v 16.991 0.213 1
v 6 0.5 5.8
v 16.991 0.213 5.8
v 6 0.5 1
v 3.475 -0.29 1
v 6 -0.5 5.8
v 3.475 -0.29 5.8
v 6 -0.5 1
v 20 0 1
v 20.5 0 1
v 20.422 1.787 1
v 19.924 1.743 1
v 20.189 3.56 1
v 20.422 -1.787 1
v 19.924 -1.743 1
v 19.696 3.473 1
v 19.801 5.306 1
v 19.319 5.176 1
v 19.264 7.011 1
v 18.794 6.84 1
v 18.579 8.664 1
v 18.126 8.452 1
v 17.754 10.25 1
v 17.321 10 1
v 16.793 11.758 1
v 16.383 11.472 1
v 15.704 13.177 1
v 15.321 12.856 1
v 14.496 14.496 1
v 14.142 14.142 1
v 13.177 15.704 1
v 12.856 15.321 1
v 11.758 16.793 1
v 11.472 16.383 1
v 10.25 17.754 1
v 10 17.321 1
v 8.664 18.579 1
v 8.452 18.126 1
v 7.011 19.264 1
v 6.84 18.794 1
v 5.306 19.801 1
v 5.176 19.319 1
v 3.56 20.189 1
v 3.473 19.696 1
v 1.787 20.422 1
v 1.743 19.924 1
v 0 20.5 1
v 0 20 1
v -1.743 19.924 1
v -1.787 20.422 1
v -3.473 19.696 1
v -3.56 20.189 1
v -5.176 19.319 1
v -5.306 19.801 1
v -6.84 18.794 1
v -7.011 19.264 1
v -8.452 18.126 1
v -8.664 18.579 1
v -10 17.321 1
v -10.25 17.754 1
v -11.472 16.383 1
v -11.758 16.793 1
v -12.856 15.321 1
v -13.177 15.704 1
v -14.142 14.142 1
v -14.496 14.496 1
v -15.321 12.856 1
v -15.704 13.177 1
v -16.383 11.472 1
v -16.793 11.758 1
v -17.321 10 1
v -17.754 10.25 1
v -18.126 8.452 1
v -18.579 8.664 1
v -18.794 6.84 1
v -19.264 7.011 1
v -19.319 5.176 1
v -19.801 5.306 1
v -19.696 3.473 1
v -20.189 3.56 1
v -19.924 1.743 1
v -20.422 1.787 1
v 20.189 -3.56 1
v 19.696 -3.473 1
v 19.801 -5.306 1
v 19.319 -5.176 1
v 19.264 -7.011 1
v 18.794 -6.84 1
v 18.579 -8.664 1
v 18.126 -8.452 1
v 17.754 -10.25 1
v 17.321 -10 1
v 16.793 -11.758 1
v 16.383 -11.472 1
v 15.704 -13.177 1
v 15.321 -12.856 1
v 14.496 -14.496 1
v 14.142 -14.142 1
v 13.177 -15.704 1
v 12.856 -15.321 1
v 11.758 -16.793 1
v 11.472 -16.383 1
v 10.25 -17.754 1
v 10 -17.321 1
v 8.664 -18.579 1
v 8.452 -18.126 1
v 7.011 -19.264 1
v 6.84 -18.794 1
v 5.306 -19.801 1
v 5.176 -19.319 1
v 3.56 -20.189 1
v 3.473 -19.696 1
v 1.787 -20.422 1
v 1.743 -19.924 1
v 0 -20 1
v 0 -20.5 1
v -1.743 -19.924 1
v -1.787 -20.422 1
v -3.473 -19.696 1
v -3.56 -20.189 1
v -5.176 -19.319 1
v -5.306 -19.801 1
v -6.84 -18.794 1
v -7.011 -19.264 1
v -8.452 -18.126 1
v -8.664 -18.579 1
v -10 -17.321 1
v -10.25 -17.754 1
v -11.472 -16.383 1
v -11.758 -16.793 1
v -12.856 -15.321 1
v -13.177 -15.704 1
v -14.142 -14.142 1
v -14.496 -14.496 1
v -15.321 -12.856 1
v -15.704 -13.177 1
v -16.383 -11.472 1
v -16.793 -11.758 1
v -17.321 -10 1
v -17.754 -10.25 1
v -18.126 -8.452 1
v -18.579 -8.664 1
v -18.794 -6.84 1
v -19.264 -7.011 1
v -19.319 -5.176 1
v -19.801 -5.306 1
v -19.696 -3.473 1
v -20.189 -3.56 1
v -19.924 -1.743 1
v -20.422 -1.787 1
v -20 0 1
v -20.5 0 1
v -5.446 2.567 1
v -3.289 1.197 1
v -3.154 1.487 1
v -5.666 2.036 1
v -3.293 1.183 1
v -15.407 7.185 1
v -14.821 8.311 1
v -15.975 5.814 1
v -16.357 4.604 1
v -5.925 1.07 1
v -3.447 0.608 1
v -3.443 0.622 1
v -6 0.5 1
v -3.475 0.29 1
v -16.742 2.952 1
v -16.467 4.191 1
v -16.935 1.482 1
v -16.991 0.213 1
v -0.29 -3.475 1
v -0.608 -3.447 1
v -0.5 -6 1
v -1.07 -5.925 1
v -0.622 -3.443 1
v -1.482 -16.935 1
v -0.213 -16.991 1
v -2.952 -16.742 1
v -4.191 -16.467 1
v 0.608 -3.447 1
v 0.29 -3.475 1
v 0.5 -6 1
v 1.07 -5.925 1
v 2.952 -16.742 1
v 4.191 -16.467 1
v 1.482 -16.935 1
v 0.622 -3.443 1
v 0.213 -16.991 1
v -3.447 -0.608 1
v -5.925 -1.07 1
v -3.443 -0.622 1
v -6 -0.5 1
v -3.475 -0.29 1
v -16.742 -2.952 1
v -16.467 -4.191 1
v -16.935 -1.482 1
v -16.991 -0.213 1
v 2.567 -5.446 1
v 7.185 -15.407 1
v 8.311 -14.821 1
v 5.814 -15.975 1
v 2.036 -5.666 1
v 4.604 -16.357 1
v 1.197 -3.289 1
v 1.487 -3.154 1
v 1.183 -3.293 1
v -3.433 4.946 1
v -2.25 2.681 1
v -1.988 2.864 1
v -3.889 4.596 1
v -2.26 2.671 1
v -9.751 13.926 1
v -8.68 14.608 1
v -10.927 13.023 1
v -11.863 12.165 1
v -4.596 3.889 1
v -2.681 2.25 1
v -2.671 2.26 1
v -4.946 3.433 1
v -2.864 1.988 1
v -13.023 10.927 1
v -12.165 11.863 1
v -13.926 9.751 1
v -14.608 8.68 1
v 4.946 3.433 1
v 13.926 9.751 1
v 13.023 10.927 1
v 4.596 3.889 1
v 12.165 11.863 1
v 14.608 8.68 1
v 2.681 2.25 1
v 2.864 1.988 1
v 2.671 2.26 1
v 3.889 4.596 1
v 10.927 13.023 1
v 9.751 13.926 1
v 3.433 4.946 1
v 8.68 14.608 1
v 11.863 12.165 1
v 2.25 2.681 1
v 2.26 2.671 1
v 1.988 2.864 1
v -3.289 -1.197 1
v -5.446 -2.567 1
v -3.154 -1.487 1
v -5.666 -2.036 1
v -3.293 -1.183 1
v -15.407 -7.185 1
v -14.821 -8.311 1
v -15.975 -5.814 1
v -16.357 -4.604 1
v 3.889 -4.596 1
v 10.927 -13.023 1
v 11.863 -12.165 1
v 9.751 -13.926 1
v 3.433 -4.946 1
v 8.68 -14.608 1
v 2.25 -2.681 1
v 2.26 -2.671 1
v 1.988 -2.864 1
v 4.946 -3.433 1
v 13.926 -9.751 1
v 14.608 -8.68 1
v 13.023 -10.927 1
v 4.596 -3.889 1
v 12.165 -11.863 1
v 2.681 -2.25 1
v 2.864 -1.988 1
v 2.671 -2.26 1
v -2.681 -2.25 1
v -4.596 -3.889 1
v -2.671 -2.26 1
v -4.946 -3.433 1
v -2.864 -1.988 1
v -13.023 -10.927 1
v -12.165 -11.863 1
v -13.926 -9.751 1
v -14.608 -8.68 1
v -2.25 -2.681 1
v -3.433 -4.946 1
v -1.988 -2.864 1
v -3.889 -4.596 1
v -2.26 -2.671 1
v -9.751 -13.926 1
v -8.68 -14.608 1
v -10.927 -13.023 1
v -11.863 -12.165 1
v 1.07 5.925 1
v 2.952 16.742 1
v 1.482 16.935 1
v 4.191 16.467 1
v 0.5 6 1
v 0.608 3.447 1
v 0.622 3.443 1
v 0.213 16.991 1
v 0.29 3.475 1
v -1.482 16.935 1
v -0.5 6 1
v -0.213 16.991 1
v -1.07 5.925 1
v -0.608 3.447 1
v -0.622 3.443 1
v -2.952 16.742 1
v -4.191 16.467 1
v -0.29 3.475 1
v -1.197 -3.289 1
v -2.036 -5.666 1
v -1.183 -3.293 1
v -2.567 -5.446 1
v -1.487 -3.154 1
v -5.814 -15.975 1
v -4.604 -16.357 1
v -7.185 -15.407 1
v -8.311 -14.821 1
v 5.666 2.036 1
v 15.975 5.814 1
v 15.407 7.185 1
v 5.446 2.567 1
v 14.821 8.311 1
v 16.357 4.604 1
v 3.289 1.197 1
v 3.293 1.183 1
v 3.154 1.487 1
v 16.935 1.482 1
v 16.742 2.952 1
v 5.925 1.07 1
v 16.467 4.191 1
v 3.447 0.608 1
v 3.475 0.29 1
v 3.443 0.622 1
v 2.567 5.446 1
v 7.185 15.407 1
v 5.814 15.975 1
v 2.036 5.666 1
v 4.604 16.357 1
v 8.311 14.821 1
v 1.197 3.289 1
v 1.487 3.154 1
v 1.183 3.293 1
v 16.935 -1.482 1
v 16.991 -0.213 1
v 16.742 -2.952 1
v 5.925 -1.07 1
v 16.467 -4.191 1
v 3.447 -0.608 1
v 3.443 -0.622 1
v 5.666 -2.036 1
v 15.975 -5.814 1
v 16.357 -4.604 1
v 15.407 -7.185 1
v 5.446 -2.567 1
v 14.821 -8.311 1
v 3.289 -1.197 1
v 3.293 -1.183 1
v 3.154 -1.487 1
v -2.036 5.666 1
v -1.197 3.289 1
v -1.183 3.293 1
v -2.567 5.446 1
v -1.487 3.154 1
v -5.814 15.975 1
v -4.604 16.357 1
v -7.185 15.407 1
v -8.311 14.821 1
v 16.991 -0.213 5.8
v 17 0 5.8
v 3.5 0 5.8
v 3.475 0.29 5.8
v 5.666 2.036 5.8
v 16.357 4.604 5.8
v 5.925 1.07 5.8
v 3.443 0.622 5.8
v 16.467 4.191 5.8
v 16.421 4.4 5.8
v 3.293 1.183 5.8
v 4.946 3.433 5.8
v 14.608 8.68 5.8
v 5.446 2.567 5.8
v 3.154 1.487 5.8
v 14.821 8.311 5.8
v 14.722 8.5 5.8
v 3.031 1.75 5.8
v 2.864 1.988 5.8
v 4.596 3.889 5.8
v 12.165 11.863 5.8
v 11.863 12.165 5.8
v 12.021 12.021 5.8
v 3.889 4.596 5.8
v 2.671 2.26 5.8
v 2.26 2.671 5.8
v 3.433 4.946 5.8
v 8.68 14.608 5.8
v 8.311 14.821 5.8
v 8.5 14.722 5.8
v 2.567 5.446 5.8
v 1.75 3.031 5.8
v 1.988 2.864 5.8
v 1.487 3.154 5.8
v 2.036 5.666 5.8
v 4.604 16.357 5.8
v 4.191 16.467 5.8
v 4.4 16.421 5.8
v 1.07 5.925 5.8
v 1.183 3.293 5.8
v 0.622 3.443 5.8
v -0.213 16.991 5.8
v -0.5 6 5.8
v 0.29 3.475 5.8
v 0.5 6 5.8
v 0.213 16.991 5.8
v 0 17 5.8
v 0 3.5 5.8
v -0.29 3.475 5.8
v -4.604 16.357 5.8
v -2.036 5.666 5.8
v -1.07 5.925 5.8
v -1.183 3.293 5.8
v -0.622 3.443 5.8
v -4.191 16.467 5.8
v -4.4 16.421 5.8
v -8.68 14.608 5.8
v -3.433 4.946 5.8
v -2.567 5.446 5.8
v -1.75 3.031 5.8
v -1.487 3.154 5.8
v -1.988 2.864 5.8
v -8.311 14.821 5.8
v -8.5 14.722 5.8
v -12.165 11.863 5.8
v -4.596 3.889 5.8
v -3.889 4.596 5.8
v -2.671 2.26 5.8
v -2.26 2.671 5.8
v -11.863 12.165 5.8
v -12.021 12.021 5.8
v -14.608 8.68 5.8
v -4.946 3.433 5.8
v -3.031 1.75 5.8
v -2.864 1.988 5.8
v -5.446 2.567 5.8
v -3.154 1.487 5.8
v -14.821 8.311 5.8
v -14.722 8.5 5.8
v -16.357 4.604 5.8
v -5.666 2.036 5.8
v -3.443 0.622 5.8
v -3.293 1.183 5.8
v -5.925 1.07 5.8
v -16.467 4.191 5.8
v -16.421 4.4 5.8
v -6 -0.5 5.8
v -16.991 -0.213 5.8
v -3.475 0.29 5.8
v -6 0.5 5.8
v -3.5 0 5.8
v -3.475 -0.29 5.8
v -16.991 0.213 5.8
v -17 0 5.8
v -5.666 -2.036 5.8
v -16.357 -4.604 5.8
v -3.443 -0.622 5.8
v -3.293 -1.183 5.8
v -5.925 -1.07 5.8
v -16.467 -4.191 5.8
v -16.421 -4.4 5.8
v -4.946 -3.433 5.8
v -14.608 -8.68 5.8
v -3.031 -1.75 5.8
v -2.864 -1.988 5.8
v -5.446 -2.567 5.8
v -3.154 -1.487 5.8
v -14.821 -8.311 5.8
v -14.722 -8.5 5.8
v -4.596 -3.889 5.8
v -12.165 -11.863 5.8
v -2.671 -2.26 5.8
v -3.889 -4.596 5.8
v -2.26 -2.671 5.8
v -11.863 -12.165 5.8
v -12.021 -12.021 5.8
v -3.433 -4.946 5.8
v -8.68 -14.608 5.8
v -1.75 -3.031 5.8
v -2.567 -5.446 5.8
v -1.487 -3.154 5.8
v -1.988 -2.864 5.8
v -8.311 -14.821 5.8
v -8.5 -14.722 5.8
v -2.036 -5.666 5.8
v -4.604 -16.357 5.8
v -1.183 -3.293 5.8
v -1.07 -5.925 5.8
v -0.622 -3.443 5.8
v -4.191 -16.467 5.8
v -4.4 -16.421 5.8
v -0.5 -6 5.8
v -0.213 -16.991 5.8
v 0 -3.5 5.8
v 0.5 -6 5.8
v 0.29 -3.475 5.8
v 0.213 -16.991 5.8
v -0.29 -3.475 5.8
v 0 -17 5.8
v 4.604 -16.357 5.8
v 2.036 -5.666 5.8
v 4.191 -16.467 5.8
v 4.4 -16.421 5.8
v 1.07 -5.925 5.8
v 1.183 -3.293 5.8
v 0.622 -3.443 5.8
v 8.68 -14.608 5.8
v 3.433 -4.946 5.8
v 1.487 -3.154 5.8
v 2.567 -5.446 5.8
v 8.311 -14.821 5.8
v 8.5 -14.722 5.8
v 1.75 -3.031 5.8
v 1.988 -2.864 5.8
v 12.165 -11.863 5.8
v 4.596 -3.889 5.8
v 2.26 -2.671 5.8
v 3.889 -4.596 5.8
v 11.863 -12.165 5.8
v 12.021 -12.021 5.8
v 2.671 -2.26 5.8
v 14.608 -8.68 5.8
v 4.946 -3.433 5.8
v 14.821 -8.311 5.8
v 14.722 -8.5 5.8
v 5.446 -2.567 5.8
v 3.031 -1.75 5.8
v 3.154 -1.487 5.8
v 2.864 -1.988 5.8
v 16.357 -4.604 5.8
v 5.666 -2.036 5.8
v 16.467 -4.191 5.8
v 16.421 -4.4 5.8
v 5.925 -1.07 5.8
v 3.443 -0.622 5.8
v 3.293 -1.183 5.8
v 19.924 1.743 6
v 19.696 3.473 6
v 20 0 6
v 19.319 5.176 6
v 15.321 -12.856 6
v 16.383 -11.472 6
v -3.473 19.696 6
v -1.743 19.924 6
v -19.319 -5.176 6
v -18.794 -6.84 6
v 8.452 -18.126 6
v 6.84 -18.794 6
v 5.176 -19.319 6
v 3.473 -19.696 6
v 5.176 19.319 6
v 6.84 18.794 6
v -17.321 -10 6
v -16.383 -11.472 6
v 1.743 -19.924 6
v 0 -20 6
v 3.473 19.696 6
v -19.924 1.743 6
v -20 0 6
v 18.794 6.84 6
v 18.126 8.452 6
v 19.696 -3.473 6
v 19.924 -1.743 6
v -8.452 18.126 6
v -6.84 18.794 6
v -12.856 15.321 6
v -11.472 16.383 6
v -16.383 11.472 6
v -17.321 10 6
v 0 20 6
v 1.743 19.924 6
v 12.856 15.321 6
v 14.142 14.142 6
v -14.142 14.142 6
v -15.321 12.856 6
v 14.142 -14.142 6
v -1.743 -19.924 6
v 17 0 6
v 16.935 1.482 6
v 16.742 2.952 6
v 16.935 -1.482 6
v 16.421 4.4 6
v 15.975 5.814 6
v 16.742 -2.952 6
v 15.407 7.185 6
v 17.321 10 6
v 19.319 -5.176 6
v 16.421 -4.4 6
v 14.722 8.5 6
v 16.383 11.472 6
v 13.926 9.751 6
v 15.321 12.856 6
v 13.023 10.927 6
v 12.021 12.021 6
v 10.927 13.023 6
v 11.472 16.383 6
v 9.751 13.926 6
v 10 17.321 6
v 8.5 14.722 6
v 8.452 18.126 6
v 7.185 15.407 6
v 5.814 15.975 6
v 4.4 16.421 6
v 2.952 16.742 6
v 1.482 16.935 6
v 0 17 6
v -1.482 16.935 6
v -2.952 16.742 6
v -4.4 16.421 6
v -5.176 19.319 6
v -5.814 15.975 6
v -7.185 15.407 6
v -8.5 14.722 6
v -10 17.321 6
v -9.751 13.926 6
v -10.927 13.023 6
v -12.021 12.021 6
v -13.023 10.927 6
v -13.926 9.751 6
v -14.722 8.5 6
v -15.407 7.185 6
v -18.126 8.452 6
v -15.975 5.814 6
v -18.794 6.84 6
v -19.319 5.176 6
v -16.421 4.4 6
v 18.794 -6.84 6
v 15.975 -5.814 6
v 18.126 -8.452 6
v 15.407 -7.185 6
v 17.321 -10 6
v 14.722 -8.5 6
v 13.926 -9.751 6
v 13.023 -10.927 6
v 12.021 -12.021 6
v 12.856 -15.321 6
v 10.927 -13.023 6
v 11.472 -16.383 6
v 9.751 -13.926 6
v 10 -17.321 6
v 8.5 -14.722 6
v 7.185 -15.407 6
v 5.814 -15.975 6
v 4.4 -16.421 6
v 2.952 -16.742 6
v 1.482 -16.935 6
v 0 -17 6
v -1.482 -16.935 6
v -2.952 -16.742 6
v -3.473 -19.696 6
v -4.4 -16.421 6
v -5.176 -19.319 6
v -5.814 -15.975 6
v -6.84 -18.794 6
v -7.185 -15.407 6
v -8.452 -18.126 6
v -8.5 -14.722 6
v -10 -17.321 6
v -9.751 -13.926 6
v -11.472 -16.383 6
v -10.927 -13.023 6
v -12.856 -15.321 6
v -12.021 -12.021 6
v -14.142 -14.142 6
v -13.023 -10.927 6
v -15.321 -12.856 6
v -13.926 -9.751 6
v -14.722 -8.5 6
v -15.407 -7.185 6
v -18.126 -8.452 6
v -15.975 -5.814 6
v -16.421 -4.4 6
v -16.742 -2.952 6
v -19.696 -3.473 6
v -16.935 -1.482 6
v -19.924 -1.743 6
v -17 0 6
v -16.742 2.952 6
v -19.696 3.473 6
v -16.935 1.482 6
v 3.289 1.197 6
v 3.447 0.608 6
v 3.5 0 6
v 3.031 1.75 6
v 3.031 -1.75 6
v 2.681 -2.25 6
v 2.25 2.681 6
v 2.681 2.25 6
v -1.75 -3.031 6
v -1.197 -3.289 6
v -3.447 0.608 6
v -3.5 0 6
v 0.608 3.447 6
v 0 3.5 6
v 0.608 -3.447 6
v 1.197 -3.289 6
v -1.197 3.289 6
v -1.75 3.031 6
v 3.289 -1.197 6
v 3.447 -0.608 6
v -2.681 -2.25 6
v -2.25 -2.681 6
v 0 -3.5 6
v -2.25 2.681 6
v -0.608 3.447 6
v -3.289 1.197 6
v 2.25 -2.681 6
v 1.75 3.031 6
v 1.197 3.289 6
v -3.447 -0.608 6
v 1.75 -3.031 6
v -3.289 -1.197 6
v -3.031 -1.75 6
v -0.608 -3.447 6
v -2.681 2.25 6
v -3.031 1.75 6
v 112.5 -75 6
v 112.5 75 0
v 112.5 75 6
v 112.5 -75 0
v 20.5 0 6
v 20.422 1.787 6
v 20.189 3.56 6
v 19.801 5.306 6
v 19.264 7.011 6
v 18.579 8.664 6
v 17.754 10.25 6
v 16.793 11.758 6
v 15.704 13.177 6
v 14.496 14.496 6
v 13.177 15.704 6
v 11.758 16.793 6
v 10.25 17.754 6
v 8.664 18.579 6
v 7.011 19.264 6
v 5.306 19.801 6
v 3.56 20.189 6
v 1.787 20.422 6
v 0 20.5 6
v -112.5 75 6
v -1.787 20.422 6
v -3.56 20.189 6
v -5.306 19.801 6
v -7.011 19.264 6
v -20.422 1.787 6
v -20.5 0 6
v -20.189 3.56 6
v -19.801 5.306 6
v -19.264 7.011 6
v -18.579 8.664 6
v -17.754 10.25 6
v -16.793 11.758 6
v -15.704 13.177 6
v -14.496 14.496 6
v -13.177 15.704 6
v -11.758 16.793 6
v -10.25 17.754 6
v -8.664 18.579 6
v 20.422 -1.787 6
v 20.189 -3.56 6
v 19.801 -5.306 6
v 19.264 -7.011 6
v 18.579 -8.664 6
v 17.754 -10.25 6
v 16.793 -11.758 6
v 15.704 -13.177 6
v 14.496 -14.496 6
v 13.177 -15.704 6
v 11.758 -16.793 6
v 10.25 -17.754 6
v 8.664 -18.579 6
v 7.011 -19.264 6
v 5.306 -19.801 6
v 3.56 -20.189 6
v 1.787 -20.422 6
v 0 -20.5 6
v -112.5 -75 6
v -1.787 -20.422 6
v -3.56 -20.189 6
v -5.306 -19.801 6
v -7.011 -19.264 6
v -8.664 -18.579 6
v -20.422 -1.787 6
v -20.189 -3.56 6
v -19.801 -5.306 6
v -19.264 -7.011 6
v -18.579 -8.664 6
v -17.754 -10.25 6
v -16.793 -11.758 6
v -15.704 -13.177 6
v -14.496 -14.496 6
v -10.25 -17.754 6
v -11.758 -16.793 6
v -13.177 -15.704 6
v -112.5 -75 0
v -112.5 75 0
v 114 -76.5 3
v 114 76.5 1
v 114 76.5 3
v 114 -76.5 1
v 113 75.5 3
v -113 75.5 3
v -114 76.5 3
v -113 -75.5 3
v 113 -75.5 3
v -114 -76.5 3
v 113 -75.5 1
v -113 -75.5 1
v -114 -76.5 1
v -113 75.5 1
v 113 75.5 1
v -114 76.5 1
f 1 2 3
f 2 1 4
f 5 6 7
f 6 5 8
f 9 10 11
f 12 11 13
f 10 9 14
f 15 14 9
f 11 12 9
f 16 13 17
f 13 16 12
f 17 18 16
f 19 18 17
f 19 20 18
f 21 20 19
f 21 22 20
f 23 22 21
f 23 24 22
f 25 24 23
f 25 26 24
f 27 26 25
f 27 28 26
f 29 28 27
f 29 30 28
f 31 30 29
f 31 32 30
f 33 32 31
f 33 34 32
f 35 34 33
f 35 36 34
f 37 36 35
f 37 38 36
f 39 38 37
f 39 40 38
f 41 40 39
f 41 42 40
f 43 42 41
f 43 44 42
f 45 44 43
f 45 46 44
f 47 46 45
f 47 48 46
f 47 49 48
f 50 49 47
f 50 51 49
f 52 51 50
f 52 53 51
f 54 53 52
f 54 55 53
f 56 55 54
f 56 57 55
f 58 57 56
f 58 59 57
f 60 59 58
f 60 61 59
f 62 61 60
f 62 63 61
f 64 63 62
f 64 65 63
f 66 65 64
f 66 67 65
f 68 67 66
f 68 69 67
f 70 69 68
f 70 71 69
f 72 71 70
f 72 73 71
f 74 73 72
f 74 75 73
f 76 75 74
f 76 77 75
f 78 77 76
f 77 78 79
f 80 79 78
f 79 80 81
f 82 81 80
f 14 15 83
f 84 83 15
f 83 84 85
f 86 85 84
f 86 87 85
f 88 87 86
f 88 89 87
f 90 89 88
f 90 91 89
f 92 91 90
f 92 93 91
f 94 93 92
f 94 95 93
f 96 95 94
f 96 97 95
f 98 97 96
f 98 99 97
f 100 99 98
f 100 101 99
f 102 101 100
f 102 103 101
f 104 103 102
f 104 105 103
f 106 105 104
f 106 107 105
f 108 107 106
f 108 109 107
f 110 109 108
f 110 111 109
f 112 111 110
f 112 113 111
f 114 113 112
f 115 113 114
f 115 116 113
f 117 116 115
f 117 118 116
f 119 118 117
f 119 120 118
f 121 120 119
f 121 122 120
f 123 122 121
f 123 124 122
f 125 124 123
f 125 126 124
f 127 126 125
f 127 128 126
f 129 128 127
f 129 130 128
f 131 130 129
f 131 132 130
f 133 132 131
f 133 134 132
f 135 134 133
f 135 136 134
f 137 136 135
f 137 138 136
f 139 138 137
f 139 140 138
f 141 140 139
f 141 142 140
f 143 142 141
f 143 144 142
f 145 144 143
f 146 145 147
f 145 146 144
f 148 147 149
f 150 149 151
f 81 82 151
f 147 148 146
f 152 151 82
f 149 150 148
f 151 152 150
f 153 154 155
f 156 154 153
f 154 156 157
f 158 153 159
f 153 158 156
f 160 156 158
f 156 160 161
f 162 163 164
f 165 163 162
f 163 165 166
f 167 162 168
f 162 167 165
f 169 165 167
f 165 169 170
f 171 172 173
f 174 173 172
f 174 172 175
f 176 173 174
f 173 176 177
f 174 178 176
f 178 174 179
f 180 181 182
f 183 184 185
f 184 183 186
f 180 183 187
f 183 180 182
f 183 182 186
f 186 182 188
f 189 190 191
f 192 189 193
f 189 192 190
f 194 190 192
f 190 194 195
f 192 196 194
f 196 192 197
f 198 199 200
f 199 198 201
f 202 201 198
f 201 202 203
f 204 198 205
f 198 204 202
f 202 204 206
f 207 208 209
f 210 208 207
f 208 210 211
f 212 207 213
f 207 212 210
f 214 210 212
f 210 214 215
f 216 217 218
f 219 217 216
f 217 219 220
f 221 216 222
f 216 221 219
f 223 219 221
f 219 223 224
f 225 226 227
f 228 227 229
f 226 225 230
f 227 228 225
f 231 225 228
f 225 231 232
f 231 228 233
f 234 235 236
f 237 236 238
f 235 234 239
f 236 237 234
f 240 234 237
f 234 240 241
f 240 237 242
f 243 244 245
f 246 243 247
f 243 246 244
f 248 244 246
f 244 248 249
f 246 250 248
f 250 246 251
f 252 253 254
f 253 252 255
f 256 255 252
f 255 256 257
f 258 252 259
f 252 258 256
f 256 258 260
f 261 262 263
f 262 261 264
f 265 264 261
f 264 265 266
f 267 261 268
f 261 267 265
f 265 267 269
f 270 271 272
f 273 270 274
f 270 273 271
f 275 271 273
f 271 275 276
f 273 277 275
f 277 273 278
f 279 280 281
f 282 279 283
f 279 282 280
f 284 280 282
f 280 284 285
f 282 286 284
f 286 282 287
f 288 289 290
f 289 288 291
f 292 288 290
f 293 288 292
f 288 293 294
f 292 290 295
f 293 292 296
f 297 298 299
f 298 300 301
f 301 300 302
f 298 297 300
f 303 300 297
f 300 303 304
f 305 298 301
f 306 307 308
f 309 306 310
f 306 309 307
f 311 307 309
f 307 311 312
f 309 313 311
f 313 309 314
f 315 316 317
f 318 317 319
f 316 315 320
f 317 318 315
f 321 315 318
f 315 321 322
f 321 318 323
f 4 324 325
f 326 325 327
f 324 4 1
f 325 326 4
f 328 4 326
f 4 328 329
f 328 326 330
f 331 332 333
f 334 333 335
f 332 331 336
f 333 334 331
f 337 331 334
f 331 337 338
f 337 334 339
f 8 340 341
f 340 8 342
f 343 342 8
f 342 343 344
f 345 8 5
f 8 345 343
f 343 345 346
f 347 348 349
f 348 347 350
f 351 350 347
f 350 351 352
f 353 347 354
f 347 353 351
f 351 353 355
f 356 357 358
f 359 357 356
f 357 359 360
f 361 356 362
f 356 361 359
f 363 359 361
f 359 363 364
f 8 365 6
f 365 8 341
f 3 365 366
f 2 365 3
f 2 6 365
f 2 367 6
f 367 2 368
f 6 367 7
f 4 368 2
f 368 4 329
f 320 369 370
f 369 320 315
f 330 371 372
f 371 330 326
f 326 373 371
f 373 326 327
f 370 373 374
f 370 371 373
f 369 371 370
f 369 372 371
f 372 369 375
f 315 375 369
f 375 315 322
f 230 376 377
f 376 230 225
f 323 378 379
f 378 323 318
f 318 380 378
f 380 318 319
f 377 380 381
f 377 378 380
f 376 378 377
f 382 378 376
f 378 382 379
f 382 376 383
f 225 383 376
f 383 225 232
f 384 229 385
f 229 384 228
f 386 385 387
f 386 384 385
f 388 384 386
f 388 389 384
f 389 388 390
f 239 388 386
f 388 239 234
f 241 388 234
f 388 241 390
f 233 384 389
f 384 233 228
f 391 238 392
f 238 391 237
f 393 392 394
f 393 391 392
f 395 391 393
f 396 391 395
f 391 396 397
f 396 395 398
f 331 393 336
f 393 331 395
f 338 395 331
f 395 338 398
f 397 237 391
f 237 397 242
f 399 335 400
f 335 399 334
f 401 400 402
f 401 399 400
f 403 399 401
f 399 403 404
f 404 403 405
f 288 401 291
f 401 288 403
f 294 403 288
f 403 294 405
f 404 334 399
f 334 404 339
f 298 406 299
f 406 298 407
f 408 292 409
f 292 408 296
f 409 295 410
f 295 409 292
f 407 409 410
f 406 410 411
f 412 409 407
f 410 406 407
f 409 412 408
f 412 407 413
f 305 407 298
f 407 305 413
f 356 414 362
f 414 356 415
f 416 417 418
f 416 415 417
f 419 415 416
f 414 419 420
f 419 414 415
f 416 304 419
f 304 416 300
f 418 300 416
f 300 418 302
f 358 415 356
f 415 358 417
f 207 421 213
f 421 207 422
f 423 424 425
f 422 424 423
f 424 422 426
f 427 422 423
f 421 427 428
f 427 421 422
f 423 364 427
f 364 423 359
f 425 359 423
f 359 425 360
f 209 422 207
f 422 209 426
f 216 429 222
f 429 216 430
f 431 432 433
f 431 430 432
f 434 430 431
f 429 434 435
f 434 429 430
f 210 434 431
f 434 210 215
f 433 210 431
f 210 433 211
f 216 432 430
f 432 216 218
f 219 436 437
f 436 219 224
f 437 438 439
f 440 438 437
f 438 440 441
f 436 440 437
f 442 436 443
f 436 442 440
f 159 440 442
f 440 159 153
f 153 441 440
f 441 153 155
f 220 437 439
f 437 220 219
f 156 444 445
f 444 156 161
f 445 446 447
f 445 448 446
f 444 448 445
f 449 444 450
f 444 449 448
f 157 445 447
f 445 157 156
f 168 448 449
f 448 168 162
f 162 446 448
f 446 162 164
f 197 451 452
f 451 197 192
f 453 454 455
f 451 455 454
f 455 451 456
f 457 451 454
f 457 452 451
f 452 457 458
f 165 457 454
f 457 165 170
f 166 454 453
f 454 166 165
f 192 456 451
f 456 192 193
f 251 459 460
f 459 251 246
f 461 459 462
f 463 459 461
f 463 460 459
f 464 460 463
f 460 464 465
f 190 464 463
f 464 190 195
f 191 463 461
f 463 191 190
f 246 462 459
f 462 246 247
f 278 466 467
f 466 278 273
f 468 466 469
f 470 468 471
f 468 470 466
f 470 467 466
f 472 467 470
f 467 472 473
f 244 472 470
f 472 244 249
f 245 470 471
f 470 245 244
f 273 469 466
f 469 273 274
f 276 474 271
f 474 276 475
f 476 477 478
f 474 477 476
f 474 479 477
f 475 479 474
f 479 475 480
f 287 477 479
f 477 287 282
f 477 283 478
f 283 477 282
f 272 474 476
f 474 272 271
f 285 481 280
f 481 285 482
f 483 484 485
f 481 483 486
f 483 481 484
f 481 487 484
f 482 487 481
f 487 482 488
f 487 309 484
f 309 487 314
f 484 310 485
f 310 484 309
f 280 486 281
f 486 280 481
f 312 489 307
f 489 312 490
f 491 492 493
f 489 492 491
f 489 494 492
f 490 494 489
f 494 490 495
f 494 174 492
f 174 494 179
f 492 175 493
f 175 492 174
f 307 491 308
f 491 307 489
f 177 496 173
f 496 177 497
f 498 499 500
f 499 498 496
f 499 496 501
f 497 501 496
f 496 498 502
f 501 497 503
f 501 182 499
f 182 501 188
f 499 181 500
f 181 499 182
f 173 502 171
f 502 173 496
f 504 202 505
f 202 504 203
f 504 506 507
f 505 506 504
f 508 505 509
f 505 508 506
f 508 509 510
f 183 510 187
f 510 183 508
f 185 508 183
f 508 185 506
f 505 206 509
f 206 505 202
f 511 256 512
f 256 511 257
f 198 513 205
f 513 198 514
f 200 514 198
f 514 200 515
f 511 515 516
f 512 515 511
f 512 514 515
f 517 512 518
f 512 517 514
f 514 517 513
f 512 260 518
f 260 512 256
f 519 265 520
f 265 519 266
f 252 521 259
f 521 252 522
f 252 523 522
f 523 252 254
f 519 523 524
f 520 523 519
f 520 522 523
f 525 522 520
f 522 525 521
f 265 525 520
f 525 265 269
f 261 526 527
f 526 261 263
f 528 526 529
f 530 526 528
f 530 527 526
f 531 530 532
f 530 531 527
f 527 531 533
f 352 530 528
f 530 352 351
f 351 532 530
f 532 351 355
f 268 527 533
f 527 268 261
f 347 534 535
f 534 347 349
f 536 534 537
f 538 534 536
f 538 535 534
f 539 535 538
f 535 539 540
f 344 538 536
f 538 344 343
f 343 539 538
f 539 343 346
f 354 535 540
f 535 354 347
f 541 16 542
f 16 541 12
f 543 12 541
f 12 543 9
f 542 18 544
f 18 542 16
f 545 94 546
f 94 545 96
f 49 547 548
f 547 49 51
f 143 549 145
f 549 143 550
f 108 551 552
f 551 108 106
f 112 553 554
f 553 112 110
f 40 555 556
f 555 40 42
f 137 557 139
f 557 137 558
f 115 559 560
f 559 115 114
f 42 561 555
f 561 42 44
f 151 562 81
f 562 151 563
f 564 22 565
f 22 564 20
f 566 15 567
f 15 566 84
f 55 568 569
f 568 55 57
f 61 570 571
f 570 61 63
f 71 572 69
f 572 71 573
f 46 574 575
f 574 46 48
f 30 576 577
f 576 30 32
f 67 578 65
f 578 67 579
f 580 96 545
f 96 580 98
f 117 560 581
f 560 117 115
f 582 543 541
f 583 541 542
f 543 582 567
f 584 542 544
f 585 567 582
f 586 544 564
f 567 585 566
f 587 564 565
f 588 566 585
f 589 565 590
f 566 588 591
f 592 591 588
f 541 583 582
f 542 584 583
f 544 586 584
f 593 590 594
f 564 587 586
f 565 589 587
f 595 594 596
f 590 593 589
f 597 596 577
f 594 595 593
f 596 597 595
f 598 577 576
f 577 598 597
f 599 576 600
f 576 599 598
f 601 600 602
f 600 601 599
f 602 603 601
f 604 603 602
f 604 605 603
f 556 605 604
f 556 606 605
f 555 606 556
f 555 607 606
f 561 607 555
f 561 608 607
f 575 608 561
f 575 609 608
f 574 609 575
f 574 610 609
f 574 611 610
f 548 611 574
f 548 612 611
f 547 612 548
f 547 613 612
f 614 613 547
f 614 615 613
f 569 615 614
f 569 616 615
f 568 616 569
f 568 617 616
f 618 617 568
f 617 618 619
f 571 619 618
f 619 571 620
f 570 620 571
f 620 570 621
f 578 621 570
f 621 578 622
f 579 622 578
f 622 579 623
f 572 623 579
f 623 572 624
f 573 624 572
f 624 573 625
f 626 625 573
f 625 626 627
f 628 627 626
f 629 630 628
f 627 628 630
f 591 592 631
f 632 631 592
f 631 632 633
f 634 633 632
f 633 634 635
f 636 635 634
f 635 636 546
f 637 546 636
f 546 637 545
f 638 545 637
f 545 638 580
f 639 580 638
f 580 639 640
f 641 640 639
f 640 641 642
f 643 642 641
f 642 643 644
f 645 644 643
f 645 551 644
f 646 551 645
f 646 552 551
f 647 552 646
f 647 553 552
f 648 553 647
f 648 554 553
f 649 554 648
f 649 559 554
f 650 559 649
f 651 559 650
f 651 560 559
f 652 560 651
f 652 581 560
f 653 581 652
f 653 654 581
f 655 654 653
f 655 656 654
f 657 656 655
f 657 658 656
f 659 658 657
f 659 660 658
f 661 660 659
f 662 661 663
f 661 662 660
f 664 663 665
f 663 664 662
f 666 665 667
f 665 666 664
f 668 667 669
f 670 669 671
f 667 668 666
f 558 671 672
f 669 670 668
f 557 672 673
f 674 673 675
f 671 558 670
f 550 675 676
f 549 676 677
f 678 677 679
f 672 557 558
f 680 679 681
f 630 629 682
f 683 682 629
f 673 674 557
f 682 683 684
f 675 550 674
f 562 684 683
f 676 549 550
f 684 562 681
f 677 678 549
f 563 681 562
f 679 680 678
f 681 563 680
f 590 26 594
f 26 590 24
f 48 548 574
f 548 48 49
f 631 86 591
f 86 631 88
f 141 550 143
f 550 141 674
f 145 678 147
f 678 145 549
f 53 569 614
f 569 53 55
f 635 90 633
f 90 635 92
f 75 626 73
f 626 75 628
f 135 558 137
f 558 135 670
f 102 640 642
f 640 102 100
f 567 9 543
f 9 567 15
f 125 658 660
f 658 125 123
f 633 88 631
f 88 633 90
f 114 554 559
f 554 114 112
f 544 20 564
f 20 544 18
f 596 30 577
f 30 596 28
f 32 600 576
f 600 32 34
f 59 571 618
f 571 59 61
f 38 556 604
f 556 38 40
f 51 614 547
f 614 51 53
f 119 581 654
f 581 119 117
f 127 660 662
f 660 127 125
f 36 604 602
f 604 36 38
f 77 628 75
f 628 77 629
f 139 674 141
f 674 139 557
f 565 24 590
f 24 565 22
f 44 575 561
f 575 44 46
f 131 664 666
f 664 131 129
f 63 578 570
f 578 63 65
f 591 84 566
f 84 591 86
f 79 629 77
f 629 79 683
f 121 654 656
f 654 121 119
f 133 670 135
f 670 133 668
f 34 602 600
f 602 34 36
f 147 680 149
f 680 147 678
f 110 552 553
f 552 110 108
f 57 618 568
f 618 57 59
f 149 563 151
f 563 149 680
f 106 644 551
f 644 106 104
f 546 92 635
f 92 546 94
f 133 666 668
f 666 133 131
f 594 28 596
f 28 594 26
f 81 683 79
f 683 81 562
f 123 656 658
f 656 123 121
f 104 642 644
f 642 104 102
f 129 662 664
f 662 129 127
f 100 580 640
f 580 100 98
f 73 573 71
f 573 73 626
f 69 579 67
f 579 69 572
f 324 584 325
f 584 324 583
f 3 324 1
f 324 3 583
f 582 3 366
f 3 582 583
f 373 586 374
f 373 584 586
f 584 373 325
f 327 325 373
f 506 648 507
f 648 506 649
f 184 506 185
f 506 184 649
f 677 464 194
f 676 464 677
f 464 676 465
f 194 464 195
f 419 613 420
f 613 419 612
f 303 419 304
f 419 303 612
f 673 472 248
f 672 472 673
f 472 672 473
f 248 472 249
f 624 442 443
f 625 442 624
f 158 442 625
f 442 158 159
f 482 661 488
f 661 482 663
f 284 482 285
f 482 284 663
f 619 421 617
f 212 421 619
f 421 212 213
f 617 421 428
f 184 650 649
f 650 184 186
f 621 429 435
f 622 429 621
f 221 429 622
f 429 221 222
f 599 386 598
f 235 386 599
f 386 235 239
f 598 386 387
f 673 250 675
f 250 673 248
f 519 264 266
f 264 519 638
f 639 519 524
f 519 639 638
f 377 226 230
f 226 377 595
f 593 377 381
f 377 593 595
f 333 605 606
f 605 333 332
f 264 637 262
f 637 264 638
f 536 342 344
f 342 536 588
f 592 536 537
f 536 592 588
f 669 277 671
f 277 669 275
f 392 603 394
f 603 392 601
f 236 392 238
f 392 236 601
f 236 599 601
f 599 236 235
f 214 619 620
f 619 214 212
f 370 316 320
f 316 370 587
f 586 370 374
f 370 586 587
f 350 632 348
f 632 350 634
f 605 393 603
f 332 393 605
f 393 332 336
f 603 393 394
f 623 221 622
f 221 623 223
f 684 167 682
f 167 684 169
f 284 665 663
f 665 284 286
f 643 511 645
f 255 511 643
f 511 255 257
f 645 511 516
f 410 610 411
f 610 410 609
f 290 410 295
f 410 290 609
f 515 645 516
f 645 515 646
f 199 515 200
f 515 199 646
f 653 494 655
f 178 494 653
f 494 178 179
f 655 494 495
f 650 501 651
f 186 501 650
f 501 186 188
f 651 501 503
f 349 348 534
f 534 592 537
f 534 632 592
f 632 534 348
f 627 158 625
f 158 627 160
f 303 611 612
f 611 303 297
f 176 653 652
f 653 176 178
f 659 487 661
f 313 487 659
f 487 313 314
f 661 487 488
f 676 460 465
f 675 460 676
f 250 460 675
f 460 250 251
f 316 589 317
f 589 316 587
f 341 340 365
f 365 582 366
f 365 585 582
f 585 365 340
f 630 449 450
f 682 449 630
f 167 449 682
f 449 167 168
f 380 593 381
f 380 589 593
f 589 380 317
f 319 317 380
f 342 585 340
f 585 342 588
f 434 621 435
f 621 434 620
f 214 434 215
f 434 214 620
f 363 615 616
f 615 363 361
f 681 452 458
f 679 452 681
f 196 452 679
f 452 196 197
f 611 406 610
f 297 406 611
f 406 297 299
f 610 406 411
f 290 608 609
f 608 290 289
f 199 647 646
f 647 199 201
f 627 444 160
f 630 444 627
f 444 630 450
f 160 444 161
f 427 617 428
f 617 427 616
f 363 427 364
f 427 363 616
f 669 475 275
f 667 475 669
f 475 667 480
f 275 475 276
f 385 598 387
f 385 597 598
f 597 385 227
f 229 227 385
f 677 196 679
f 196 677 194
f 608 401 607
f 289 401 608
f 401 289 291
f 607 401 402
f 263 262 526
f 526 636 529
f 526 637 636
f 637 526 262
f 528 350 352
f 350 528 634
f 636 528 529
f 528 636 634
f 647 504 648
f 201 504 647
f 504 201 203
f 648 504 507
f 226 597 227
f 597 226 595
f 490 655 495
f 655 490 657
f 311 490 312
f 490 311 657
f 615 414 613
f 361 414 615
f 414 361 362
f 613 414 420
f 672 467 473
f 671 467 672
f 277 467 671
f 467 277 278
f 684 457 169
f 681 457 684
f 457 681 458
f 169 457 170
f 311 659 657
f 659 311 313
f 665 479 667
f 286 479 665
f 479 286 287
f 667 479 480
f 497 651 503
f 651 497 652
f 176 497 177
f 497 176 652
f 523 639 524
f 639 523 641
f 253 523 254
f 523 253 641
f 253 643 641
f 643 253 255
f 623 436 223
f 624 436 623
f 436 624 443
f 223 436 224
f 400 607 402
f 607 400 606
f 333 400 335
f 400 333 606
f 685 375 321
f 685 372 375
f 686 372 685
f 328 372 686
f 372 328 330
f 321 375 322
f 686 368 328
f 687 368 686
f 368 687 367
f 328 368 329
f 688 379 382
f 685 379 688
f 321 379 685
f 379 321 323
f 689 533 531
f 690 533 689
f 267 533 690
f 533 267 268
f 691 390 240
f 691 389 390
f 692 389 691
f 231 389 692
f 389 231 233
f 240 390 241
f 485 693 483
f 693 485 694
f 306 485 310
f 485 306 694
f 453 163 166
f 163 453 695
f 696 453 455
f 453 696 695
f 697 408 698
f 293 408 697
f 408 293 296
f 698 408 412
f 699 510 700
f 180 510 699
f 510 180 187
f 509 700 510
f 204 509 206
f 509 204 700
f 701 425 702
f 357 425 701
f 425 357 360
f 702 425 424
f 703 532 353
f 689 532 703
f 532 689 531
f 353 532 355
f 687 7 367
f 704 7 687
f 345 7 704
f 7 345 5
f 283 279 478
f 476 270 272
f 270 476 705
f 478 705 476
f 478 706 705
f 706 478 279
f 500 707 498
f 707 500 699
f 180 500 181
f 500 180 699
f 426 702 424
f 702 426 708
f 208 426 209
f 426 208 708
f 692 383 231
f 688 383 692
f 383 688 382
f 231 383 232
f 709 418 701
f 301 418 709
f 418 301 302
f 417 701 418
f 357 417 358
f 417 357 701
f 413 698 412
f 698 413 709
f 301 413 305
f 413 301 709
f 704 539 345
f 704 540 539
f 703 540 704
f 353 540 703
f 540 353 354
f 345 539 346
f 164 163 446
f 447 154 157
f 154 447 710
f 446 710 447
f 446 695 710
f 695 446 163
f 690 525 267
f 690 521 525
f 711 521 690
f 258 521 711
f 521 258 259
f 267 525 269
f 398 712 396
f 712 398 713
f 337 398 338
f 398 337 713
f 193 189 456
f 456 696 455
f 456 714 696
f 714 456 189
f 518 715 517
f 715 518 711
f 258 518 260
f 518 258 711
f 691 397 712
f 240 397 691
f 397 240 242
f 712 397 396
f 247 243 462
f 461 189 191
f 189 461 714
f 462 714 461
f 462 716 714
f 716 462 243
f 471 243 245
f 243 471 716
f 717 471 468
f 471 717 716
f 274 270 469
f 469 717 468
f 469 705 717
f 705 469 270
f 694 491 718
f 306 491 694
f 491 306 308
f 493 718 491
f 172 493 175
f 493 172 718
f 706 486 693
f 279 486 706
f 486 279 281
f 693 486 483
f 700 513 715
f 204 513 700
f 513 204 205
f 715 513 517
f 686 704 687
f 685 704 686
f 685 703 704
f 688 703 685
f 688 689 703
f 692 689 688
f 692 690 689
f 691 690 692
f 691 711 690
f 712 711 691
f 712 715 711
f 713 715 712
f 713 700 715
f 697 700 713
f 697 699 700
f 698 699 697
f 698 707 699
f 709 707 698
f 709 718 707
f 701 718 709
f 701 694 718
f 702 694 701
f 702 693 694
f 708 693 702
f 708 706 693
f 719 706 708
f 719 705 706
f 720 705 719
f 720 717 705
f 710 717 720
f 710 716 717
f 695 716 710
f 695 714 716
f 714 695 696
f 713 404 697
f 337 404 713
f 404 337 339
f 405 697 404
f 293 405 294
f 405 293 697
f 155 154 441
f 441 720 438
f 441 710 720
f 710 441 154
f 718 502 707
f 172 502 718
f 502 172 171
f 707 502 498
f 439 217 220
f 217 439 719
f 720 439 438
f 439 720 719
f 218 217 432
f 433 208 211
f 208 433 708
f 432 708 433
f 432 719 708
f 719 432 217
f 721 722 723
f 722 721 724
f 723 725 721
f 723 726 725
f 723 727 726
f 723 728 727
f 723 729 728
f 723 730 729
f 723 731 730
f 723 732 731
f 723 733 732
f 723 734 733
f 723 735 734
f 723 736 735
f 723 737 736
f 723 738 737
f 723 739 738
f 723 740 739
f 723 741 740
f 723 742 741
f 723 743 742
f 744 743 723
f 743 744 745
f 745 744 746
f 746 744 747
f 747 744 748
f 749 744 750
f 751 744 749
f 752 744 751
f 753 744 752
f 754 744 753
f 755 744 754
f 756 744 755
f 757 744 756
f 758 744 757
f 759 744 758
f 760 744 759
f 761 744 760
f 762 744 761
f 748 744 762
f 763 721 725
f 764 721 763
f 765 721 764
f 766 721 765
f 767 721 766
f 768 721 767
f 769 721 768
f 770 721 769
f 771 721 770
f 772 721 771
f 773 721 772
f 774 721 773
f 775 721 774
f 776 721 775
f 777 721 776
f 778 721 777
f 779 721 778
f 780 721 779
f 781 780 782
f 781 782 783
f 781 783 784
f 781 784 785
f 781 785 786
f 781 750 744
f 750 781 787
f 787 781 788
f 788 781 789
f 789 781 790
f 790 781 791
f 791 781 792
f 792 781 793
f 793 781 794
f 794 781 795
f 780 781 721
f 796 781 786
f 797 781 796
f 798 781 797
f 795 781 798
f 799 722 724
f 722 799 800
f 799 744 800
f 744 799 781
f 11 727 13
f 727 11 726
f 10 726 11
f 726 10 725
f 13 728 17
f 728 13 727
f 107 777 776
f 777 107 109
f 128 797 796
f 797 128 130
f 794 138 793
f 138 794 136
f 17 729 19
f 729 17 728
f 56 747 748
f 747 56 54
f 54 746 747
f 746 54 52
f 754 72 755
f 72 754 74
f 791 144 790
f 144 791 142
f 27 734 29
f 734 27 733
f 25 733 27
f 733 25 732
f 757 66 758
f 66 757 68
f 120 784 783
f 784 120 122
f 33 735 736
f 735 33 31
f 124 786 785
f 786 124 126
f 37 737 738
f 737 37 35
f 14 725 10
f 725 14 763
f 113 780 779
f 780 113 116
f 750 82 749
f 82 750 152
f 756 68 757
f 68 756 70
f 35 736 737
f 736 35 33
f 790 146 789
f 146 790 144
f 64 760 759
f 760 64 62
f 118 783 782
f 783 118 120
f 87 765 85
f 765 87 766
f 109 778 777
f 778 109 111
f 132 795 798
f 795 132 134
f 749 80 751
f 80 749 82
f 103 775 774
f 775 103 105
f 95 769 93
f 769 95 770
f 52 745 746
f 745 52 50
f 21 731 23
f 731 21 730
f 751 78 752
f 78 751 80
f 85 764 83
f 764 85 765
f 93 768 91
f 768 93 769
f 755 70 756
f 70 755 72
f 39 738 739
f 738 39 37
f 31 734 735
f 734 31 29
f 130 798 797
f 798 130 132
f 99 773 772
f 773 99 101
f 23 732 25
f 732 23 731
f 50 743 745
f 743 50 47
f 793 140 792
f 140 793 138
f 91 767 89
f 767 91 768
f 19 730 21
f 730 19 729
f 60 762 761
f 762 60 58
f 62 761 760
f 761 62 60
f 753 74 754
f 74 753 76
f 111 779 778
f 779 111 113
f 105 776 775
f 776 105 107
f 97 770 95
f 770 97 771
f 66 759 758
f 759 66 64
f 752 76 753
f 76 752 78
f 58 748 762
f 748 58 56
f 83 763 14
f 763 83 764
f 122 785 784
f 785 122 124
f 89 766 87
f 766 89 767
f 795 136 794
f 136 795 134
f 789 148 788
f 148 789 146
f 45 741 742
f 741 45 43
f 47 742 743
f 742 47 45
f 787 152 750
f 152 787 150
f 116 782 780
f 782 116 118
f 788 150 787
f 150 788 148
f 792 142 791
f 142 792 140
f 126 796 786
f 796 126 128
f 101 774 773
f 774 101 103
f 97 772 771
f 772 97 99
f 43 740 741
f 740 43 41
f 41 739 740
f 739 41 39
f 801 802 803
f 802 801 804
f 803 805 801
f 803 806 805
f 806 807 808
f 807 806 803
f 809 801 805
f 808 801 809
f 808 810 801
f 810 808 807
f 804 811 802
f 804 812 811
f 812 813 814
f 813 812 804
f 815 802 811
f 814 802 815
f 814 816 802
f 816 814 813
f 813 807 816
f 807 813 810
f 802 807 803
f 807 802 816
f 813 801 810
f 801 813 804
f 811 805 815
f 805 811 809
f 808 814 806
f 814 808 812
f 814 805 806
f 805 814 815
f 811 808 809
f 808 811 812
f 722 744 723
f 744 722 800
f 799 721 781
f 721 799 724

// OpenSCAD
/**
 * Flag of India
 * by Raj Madhuram
 * 08/15/2018 - Happy Independence Day!
 */
module chakra() {
  cylinder($fn = 36,  h = 5, r = 3.5);
  for (angle = [0:15:345]) 
    linear_extrude(height = 4.8) rotate([0, 0, angle]) polygon([[0,0],[6,-0.5],[17.5,-0.2],[17.5, 0.2],[6,0.5]]);
  
  difference() {
    cylinder($fn = 72,  h = 5, r = 20);
    cylinder($fn = 72,  h = 5.1, r = 17);
  }  
}

module flag_white() {
  difference() {
    translate([0,0,3]) cube([225, 50, 6], center=true);
    translate([0,0,1]) cylinder($fn = 72, h = 6, r = 20.5);
  }
}

module flag_orange() {
  translate([0,50,3]) cube([225, 50, 6], center=true);
}

module flag_green() {
  translate([0,-50,3]) cube([225, 50, 6], center=true);
}

module holder() {
  difference() {
    translate([0,0,2]) cube([228, 153, 2], center=true);
    translate([0,0,2]) cube([226, 151, 2.1], center=true);
  }   
}

translate([0,0,1]) color("blue") chakra();
color("white") flag_white();
color("orange") flag_orange();
color("green") flag_green();
color("white") holder();
